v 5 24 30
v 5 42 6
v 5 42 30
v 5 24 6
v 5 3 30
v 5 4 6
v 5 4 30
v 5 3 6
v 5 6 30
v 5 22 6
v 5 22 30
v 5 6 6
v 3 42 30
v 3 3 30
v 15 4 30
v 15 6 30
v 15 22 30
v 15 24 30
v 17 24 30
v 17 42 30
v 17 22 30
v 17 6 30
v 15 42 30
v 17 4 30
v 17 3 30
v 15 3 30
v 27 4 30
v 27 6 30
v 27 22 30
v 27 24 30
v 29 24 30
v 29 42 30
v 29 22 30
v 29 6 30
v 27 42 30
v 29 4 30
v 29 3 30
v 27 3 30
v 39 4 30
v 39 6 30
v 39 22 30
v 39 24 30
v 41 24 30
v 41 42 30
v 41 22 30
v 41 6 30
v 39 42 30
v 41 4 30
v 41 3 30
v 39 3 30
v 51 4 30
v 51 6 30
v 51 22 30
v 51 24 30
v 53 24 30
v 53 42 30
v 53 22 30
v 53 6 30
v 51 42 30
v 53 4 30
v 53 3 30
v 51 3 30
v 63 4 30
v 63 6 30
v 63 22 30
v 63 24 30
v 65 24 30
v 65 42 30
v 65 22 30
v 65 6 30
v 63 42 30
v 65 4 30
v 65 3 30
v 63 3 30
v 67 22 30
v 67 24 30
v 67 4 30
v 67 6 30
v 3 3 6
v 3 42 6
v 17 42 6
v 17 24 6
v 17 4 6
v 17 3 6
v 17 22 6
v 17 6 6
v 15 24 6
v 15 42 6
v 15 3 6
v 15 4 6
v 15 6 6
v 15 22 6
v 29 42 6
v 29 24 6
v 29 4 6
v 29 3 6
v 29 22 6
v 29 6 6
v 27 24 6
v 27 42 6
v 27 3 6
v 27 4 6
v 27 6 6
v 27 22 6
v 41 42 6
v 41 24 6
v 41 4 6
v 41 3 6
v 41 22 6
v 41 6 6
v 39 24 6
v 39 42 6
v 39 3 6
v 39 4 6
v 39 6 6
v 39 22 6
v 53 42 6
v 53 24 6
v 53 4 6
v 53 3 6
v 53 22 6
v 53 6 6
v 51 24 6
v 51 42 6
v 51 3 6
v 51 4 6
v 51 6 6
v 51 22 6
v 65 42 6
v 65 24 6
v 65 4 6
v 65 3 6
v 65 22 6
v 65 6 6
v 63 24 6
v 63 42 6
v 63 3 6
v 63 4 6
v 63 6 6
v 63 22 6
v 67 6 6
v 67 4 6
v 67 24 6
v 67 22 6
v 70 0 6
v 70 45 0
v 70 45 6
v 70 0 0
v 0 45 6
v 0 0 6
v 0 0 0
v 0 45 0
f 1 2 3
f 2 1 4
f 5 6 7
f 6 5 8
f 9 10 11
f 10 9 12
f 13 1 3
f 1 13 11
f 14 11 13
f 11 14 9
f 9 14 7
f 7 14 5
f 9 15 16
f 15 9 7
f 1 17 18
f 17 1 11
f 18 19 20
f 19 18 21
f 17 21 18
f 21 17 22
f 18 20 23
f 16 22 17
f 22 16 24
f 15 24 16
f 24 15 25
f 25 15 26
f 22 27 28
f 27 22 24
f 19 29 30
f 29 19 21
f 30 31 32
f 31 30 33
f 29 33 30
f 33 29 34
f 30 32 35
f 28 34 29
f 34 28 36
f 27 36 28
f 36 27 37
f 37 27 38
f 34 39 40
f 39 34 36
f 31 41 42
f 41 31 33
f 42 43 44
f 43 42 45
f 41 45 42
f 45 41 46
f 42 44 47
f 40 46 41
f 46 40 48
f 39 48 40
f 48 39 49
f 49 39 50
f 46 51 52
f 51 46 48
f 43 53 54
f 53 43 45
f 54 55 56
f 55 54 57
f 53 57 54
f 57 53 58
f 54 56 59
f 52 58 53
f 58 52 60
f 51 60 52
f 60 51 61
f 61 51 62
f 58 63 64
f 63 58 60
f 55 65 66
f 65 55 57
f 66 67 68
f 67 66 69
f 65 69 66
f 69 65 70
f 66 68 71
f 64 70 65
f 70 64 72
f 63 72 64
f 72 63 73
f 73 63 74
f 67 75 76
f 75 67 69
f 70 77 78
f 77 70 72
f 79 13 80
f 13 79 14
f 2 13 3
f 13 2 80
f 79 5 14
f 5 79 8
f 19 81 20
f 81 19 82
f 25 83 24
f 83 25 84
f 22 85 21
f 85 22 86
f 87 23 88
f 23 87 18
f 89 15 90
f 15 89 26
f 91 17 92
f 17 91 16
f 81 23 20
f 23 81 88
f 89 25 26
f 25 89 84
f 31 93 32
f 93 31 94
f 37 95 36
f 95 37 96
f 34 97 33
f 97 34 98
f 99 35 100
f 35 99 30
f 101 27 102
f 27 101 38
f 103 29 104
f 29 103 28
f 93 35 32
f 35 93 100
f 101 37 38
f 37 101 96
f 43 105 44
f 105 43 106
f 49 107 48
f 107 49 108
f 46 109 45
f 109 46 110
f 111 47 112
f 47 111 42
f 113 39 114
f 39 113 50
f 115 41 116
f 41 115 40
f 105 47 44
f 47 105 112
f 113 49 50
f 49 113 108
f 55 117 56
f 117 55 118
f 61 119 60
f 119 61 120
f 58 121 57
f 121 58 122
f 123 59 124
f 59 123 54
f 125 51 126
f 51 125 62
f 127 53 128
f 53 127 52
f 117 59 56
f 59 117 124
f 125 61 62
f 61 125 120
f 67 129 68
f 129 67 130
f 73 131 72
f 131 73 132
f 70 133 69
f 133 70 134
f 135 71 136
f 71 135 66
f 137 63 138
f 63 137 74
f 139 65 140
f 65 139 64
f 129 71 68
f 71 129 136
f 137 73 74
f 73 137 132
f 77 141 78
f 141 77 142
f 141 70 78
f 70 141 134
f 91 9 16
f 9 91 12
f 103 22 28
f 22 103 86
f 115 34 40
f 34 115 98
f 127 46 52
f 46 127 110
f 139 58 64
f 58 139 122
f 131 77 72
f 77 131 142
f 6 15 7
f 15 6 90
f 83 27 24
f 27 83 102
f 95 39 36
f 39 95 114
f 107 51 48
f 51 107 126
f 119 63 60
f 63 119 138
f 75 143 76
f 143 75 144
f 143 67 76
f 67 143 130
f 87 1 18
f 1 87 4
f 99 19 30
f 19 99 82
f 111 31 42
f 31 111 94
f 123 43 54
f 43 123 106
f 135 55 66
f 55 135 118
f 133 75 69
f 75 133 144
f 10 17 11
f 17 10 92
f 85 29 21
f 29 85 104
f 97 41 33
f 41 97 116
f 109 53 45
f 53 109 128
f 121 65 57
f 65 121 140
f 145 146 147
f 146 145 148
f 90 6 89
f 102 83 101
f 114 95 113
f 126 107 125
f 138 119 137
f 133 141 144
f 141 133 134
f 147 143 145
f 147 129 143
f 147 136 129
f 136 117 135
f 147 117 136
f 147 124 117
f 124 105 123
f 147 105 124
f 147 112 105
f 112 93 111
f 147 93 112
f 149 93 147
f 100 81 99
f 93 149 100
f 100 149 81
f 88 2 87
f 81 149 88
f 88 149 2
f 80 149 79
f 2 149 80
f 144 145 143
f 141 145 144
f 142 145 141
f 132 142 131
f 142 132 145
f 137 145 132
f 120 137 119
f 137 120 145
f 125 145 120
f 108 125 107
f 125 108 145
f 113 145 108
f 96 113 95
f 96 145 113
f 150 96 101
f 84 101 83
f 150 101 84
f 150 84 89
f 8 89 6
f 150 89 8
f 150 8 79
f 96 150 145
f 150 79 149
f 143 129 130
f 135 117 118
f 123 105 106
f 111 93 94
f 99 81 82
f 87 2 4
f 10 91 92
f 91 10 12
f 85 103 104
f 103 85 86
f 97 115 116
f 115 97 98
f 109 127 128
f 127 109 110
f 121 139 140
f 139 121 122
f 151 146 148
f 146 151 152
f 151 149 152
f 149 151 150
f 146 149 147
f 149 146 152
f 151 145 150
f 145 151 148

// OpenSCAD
$fn = 32;

// ----------------------------------------------------------------------
// Heatsink: cross fin block
// ----------------------------------------------------------------------

// --- parameters (mm) ---
base_l = 70;              // base length, X
base_w = 45;              // base width, Y
base_t = 6;               // base plate thickness
fin_h = 25;               // fin height above the base
fin_t = 2;                // fin thickness
edge = 3;                 // margin from the base ends
pitch = 12;               // fin pitch
rib_pitch = 18;           // cross rib pitch

n_fins = floor((base_l - 2 * edge - fin_t) / pitch) + 1;  // fin count
total_h = base_t + fin_h - 1;  // overall height
n_ribs = floor((base_w - 2 * edge) / rib_pitch);  // rib count

union() {
  cube([base_l, base_w, base_t]);
  for (i = [0 : n_fins - 1])
    translate([edge + i * pitch, edge, base_t - 1])
      cube([fin_t, base_w - 2 * edge, fin_h]);
  for (i = [0 : n_ribs - 1])
    translate([edge, edge + 1 + i * rib_pitch, base_t - 1])
      cube([base_l - 2 * edge, fin_t, fin_h]);
}
